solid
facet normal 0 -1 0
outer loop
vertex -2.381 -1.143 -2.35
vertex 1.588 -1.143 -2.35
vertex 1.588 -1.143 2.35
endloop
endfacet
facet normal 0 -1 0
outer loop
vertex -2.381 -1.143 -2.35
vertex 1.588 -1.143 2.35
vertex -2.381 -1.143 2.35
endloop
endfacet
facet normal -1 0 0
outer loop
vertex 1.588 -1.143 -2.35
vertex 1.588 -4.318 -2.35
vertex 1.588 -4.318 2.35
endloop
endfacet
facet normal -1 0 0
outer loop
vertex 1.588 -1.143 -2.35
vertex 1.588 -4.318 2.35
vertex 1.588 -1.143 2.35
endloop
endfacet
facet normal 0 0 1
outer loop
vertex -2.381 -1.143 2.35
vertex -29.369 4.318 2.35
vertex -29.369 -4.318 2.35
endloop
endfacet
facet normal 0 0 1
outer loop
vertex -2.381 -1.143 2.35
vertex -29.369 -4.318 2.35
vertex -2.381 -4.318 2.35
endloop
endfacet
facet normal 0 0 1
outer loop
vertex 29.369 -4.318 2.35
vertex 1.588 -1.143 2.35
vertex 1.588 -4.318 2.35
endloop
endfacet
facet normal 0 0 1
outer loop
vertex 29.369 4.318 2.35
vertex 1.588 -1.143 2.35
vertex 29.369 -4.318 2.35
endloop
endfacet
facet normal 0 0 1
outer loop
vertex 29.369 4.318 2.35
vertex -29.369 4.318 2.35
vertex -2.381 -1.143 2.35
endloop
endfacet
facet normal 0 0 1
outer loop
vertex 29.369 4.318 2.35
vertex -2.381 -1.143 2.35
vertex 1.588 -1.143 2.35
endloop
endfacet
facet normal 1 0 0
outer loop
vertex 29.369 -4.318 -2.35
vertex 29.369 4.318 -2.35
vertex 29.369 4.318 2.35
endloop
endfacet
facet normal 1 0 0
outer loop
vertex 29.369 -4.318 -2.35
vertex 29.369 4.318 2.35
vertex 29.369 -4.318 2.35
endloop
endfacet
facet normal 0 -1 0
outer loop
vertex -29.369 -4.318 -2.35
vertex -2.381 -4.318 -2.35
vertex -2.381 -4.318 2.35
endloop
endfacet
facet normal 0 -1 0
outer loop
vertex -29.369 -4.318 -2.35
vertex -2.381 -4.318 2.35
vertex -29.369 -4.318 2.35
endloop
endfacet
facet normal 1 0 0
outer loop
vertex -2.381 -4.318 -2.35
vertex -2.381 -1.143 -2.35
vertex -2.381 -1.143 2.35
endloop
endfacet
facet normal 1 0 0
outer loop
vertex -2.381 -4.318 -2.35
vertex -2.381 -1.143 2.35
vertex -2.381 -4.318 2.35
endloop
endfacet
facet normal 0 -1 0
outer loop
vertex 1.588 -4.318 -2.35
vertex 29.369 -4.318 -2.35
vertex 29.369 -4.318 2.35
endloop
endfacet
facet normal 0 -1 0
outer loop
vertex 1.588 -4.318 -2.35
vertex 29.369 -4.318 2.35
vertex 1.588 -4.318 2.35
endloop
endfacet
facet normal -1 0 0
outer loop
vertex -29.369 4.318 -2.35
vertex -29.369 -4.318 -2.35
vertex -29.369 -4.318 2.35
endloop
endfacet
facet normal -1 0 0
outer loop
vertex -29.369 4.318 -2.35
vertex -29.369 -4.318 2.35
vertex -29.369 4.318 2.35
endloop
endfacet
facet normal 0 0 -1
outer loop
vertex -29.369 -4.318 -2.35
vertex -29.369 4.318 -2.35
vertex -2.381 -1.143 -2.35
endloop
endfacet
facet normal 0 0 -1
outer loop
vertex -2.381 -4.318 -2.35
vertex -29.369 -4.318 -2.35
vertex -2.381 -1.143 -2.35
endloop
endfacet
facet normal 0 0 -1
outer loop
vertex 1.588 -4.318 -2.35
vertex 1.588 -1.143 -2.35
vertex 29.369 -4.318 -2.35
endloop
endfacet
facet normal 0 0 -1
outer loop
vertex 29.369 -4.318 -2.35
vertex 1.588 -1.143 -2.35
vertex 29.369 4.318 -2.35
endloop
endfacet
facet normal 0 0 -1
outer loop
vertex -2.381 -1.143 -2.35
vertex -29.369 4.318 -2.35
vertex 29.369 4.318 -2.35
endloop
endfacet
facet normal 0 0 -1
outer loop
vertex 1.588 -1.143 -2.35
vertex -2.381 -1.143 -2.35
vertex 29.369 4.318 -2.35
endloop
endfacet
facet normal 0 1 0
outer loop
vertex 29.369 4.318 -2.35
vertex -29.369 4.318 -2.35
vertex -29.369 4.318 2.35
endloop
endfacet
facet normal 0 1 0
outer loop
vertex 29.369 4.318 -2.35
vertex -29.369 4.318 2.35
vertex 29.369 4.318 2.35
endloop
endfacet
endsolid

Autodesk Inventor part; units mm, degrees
ref_plane "YZ Plane" through (0, 0, 0) normal (1, 0, 0) x (0, 1, 0)
ref_plane "XZ Plane" through (0, 0, 0) normal (0, 1, 0) x (-1, 0, 0)
sketch "Sketch1" plane through (0, 0, 0) normal (0, 0, 1) x (1, 0, 0)
  line L0 (-29.3688, -4.318) -> (-29.3688, 4.318)
  line L1 (-29.3688, 4.318) -> (29.3688, 4.318)
  line L2 (29.3688, 4.318) -> (29.3688, -4.318)
  line L3 (29.3688, -4.318) -> (1.5875, -4.318)
  line L4 (1.5875, -4.318) -> (1.5875, -1.143)
  line L5 (1.5875, -1.143) -> (-2.3812, -1.143)
  line L6 (-2.3812, -1.143) -> (-2.3812, -4.318)
  line L7 (-2.3812, -4.318) -> (-29.3688, -4.318)
  point P0 (0, 0)
  point P1 (0, 4.318)
  point P2 (-29.3688, 0)
  dimension "d0" = 58.7375
  dimension "d1" = 3.9688
  dimension "d2" = 3.175
  dimension "d3" = 27.7812
  dimension "d4" = 8.636
extrude "Extrusion1" add sketch "Sketch1" along normal mid plane 4.699
ref_plane "Work Plane1" through (-0.3969, -4.318, 2.3495) normal (1, 0, 0) x (0, 0, -1)
properties part number "Slide_Key" material "Steel, High Strength Low Alloy"
